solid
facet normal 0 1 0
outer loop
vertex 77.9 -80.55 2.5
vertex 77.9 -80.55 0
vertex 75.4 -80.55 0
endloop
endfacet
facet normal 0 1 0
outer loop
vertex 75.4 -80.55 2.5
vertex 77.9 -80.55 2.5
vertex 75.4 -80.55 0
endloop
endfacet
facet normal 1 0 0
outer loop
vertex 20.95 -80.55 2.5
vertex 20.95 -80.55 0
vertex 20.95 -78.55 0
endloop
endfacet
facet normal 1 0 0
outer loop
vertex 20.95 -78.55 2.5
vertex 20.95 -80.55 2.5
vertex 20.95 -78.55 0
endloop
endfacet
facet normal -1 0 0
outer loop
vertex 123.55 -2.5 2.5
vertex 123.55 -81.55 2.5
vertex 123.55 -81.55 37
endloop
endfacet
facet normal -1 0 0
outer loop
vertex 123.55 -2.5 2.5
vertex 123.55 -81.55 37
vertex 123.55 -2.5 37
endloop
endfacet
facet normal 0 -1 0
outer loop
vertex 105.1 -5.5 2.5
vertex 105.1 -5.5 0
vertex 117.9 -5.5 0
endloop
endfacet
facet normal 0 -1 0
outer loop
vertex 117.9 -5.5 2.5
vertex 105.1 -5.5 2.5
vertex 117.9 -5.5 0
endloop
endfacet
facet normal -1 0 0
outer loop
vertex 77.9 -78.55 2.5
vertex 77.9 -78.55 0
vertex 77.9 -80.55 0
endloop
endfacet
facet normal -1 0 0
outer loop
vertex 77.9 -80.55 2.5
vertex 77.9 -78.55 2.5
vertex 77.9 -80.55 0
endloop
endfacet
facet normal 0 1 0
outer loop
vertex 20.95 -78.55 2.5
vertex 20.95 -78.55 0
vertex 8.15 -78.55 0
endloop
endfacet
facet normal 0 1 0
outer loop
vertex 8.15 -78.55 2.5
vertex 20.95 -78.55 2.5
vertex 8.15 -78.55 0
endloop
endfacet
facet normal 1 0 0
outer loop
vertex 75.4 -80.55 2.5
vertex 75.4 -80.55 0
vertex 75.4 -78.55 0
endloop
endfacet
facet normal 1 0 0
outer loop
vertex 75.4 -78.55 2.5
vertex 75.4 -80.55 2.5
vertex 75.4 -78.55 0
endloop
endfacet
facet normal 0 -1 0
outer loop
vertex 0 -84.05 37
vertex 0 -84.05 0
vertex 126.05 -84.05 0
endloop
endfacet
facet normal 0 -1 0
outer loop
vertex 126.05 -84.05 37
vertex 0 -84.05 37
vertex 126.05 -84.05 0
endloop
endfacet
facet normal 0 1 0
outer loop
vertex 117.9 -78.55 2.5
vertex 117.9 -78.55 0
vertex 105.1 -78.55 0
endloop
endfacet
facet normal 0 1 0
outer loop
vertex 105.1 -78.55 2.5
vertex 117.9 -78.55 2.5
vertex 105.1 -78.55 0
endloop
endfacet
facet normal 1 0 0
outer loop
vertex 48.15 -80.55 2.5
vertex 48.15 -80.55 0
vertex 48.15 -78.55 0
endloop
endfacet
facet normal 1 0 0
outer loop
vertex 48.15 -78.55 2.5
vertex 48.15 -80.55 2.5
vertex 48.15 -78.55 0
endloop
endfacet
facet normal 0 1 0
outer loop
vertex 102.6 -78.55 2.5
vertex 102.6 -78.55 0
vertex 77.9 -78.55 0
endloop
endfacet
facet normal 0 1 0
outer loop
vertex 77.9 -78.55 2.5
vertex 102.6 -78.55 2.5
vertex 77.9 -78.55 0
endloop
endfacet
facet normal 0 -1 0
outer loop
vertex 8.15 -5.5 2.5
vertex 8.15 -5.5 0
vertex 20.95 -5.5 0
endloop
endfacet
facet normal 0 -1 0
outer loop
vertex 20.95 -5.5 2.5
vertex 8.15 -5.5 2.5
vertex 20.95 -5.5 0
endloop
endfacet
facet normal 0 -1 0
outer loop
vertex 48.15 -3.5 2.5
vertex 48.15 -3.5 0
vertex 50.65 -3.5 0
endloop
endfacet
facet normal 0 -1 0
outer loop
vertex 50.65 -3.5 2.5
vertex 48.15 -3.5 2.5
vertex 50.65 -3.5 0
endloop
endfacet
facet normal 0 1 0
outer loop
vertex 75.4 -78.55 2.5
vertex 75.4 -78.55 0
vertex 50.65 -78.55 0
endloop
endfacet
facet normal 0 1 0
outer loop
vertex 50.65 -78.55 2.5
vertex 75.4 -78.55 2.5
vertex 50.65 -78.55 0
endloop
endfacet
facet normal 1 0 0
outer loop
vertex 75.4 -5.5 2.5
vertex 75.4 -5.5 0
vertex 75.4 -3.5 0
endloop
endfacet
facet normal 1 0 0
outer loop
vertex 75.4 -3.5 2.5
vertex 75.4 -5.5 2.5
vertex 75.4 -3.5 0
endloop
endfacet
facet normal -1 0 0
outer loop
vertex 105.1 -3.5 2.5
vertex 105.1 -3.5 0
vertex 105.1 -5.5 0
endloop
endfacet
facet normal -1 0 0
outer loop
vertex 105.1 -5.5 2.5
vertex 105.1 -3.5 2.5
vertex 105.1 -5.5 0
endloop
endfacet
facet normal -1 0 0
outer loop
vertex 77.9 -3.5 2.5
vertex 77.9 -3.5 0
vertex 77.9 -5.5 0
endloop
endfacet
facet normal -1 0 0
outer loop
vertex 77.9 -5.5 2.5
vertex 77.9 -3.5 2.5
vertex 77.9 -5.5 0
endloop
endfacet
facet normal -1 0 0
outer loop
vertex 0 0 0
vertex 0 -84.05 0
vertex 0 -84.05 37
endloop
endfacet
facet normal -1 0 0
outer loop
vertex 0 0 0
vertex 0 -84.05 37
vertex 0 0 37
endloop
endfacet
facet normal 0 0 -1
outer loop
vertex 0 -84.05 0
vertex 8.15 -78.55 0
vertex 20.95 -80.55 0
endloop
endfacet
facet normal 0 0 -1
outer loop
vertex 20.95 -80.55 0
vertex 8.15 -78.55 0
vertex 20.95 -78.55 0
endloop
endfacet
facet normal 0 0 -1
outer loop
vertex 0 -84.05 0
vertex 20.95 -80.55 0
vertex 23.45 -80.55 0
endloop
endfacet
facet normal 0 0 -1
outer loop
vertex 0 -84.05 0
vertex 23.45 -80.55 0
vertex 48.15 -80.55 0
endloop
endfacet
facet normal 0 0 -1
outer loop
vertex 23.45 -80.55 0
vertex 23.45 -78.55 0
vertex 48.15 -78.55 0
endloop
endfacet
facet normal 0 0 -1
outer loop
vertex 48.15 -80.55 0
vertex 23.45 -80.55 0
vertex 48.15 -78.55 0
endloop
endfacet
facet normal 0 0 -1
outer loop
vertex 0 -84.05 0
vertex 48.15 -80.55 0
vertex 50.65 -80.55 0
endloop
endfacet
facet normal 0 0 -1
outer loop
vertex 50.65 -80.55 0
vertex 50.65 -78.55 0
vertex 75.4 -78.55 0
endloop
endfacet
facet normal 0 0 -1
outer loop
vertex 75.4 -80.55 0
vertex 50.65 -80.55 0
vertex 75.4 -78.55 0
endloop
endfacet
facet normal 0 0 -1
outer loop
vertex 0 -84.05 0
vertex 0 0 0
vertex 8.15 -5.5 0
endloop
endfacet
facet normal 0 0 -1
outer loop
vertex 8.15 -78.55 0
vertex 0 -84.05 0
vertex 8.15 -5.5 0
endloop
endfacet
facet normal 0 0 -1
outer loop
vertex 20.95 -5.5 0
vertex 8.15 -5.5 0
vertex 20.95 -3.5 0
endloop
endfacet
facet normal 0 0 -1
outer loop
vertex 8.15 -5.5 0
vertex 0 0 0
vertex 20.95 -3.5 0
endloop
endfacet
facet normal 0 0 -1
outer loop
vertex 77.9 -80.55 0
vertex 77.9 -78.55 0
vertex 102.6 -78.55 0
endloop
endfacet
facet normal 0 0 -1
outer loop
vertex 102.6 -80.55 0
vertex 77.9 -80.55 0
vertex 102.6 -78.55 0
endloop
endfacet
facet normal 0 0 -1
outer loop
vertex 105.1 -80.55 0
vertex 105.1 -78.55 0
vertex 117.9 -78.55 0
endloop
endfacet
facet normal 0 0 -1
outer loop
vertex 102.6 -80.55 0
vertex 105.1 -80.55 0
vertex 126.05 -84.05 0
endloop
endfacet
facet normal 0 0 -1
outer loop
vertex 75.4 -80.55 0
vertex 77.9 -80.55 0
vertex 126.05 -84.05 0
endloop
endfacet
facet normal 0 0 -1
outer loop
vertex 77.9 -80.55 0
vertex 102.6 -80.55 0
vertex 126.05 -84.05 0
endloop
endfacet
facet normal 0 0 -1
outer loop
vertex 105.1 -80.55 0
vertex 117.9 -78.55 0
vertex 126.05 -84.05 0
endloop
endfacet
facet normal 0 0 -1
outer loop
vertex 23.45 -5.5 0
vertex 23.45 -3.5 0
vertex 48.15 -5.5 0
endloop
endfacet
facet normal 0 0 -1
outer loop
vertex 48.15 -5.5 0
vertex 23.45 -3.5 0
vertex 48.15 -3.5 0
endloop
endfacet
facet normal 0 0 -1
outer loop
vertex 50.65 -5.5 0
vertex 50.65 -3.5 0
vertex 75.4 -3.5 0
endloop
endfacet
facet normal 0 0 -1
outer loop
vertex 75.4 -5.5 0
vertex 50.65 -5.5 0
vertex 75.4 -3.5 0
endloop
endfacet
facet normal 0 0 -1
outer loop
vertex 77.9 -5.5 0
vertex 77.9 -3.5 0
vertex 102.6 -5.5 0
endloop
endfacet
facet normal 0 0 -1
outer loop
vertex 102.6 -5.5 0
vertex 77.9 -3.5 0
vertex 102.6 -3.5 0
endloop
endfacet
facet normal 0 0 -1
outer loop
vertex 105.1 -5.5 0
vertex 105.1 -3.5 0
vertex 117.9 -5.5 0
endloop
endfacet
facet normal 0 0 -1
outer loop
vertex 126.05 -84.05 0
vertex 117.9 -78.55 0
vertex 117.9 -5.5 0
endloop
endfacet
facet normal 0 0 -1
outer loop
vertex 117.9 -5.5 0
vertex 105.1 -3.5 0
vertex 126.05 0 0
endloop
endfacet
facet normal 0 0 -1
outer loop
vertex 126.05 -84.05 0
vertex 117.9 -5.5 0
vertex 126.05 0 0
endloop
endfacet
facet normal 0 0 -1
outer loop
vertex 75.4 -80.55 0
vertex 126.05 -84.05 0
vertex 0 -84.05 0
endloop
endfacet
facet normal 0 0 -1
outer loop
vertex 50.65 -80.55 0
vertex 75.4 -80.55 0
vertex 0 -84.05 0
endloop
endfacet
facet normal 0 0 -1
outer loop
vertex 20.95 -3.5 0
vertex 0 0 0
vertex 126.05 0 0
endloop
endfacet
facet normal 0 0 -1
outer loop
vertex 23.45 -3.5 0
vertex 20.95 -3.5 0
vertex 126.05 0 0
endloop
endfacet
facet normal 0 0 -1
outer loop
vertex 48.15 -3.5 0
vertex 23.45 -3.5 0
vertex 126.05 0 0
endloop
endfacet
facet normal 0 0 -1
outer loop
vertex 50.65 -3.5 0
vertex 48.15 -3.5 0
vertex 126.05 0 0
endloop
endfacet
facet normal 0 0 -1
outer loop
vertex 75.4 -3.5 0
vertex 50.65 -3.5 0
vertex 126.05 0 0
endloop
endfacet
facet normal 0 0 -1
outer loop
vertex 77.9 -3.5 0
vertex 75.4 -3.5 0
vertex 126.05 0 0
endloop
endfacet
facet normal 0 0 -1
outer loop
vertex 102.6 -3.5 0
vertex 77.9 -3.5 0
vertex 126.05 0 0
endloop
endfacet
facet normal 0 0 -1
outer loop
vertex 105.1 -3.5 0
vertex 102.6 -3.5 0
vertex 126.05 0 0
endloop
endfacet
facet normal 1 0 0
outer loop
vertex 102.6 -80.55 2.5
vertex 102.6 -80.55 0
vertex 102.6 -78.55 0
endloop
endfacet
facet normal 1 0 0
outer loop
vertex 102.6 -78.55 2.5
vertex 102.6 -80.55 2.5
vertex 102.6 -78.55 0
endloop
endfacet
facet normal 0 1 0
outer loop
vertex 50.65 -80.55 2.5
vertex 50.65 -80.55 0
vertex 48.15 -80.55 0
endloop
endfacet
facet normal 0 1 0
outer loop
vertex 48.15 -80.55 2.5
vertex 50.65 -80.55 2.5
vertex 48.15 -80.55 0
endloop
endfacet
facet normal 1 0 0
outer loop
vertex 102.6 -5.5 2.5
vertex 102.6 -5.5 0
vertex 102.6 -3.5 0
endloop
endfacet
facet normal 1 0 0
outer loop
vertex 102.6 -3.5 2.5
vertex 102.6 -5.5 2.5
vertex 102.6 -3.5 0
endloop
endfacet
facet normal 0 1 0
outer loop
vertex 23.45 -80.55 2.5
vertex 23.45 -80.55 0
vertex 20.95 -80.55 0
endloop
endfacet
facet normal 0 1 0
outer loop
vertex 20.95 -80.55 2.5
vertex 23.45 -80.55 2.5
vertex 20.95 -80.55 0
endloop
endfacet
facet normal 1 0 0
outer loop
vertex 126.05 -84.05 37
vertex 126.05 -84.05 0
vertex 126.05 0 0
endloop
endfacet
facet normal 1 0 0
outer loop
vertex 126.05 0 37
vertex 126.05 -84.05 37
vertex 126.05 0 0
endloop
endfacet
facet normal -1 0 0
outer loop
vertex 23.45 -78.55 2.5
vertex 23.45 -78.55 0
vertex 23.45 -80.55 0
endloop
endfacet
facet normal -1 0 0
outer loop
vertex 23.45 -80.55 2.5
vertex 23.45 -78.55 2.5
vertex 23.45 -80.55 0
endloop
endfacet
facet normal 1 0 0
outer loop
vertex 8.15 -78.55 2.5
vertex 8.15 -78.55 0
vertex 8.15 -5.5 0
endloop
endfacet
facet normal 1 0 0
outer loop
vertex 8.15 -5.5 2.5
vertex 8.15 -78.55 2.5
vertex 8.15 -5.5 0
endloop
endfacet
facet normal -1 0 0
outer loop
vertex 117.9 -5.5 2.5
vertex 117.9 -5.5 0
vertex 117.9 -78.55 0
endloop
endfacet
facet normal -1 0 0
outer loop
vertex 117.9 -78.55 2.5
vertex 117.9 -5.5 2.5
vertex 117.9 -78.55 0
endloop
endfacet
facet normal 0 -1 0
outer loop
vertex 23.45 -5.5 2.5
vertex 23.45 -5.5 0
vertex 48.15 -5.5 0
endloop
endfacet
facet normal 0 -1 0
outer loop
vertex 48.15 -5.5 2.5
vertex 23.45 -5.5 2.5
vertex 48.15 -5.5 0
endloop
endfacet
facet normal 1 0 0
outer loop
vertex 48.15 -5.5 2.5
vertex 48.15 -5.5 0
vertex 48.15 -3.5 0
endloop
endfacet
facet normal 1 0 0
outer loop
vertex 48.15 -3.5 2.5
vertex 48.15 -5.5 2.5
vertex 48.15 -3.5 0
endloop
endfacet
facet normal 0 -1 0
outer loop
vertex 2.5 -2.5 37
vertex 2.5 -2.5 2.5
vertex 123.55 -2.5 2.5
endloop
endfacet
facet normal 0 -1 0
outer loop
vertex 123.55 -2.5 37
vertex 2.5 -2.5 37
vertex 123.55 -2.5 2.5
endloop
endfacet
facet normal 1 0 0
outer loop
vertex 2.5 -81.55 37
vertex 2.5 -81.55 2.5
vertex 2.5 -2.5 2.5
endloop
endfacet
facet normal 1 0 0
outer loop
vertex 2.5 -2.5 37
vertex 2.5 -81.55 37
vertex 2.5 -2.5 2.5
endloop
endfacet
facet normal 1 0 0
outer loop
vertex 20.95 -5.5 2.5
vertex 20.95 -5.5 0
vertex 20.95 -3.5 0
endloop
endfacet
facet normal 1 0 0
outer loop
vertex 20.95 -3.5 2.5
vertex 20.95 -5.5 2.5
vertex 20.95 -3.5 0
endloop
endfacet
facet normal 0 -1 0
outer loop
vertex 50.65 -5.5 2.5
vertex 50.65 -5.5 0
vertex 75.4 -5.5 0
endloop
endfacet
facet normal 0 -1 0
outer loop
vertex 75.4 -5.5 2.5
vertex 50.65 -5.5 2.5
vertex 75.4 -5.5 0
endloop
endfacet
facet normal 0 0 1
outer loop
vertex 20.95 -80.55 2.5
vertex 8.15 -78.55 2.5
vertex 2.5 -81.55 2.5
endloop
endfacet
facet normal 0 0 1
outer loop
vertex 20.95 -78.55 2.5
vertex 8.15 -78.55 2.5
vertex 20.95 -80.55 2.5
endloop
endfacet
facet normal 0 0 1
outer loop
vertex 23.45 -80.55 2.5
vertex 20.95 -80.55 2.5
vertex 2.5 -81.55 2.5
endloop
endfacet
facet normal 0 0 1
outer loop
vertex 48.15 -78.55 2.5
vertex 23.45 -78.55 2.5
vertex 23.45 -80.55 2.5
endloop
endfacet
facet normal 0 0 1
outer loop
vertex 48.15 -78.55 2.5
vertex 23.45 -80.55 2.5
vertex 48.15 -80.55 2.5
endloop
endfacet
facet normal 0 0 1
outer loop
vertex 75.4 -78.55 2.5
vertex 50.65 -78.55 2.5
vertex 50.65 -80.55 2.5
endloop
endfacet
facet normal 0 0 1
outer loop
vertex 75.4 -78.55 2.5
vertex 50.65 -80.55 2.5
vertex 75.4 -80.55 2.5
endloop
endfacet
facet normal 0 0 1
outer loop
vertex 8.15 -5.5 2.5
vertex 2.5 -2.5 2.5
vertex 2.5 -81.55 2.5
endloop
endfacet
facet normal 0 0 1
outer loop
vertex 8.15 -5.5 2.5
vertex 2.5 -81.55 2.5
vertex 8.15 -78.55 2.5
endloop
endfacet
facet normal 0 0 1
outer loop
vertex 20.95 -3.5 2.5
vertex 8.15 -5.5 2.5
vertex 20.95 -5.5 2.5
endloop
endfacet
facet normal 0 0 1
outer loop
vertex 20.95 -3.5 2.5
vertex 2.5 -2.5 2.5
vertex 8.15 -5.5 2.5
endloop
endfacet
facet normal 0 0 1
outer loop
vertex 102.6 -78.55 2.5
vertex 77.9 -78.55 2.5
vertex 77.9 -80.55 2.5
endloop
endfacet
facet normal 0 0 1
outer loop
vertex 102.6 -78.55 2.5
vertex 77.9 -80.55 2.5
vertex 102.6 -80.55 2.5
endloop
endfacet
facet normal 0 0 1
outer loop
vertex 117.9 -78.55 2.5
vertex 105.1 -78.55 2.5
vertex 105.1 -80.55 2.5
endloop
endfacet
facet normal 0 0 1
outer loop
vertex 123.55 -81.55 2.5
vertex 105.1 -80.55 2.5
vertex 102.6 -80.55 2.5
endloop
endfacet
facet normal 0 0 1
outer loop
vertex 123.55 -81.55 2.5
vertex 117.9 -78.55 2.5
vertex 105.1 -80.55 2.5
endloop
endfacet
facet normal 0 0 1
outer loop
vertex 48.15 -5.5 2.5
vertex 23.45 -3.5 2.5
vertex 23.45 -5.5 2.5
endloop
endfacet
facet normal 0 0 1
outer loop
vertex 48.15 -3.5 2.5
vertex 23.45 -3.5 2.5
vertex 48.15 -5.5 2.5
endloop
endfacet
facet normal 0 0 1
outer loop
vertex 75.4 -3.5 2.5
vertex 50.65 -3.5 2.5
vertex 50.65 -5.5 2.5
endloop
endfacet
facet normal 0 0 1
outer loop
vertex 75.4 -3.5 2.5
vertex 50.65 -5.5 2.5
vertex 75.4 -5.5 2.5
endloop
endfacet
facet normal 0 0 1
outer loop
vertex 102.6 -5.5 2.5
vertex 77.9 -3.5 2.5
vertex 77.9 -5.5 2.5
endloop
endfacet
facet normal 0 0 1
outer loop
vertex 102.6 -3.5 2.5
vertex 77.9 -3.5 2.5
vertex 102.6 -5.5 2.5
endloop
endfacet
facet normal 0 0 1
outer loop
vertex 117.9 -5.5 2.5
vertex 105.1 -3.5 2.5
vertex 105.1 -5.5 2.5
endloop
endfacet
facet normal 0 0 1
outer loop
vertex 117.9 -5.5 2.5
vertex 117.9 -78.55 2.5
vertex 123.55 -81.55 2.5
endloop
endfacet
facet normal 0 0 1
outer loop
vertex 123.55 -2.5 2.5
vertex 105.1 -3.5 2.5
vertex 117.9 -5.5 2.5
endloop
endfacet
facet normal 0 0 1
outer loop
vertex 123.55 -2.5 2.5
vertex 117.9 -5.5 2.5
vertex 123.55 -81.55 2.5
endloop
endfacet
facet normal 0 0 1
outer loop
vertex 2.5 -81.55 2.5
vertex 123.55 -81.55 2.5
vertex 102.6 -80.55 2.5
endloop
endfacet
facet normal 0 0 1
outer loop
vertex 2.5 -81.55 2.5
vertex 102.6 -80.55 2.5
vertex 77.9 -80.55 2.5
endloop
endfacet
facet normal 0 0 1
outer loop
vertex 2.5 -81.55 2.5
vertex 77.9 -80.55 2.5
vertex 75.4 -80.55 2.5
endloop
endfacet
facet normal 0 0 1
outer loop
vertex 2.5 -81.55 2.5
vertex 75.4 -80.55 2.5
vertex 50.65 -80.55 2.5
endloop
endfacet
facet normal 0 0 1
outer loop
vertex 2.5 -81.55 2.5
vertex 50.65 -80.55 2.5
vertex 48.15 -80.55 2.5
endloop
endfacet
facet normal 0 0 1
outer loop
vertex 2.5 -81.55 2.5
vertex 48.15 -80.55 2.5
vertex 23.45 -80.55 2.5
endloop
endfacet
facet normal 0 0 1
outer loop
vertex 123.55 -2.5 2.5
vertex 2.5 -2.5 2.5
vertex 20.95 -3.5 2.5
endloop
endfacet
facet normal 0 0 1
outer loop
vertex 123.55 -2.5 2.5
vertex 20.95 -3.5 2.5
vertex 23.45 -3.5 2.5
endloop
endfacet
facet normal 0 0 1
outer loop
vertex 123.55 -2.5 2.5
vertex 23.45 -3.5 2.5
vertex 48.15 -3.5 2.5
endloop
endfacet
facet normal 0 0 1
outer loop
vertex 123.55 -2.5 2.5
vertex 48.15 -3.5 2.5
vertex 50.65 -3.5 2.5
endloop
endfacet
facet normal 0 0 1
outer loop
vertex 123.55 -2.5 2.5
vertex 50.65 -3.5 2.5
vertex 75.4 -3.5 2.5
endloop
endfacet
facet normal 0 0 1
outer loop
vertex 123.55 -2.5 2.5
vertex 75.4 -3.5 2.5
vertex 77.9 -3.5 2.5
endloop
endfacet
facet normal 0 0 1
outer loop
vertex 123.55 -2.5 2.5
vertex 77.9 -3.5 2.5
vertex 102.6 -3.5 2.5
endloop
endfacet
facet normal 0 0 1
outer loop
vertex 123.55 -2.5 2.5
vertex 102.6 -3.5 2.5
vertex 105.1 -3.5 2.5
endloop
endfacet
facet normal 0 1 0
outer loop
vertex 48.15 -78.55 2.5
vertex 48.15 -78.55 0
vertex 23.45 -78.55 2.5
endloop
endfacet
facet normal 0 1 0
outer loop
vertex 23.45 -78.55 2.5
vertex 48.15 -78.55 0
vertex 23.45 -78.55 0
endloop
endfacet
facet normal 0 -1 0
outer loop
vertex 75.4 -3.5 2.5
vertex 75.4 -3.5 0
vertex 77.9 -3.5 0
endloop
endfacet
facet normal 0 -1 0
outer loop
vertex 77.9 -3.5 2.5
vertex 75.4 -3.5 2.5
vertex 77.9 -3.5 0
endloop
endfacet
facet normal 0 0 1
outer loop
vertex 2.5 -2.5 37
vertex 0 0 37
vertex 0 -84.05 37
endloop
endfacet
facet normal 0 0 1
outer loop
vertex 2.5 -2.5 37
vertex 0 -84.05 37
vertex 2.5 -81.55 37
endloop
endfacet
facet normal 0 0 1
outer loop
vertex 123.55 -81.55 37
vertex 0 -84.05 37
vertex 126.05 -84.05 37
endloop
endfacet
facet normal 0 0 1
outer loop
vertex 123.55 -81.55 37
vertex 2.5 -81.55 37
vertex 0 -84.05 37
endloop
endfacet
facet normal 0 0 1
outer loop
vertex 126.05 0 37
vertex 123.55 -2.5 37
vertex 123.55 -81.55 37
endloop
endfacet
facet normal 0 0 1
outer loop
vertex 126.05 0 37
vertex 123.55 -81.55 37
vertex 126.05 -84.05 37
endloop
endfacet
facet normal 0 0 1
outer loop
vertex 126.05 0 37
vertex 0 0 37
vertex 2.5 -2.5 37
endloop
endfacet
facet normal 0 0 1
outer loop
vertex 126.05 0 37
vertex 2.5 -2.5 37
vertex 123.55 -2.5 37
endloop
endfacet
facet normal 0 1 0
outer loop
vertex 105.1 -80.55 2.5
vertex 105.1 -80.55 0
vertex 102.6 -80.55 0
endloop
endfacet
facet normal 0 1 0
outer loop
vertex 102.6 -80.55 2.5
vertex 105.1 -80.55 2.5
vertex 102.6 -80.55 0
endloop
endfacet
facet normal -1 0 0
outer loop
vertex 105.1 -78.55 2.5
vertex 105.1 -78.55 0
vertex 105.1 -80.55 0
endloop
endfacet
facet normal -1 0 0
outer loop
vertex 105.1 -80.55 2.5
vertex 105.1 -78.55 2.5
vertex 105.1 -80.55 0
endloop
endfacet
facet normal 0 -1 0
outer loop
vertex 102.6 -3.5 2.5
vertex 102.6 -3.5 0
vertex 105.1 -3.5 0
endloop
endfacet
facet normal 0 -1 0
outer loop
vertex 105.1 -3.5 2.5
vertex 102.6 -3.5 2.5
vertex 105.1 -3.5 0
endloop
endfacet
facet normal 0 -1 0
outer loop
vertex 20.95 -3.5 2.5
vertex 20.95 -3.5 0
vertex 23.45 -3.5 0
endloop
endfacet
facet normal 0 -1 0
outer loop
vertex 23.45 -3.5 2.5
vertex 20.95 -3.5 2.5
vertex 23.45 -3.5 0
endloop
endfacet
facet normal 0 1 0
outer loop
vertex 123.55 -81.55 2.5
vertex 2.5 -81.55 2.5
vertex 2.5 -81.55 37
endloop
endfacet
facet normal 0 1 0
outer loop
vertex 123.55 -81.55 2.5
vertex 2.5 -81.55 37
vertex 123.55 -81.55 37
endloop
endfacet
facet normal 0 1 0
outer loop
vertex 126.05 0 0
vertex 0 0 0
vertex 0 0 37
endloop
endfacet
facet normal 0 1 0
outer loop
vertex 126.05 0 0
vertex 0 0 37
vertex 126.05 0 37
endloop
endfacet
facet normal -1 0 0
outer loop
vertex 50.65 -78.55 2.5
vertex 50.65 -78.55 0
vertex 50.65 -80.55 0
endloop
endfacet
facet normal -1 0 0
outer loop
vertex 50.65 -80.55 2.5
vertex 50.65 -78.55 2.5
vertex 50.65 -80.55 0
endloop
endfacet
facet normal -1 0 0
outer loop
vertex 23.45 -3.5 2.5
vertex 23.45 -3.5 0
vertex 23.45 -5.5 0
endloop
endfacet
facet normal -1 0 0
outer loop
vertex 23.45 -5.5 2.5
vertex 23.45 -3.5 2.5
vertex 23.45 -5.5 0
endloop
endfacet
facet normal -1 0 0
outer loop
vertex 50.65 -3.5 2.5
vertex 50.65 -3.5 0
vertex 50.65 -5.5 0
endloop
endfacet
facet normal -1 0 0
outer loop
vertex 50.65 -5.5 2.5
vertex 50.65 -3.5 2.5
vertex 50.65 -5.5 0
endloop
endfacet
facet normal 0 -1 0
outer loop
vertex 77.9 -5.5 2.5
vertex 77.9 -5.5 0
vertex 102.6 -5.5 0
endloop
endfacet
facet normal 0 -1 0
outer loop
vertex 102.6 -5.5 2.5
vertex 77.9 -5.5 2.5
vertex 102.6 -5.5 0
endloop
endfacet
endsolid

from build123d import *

# Parameters (mm, degrees)
F0_W     = 121.05
F0_H     = 79.05
F1_DEPTH = 2.5
F0_W_2   = 126.05
F0_H_2   = 84.05
F2_DEPTH = 37


with BuildPart() as f1:
    # F0 (on Top) → F1 (new body)
    with BuildSketch(Plane.XY):
        with Locations((63.025, -42.025)):
            Rectangle(F0_W, F0_H)
        Polygon((8.15, -78.55), (8.15, -5.5), (20.95, -5.5), (20.95, -3.5), (23.45, -3.5), (23.45, -5.5), (48.15, -5.5), (48.15, -3.5), (50.65, -3.5), (50.65, -5.5), (75.4, -5.5), (75.4, -3.5), (77.9, -3.5), (77.9, -5.5), (102.6, -5.5), (102.6, -3.5), (105.1, -3.5), (105.1, -5.5), (117.9, -5.5), (117.9, -78.55), (105.1, -78.55), (105.1, -80.55), (102.6, -80.55), (102.6, -78.55), (77.9, -78.55), (77.9, -80.55), (75.4, -80.55), (75.4, -78.55), (50.65, -78.55), (50.65, -80.55), (48.15, -80.55), (48.15, -78.55), (23.45, -78.55), (23.45, -80.55), (20.95, -80.55), (20.95, -78.55), align=None, mode=Mode.SUBTRACT)
    extrude(amount=F1_DEPTH)

    # F0 (on Top) → F2 (join)
    with BuildSketch(Plane.XY):
        with Locations((63.025, -42.025)):
            Rectangle(F0_W_2, F0_H_2)
        with Locations((63.025, -42.025)):
            Rectangle(F0_W, F0_H, mode=Mode.SUBTRACT)
    extrude(amount=F2_DEPTH)


solid = f1.part
